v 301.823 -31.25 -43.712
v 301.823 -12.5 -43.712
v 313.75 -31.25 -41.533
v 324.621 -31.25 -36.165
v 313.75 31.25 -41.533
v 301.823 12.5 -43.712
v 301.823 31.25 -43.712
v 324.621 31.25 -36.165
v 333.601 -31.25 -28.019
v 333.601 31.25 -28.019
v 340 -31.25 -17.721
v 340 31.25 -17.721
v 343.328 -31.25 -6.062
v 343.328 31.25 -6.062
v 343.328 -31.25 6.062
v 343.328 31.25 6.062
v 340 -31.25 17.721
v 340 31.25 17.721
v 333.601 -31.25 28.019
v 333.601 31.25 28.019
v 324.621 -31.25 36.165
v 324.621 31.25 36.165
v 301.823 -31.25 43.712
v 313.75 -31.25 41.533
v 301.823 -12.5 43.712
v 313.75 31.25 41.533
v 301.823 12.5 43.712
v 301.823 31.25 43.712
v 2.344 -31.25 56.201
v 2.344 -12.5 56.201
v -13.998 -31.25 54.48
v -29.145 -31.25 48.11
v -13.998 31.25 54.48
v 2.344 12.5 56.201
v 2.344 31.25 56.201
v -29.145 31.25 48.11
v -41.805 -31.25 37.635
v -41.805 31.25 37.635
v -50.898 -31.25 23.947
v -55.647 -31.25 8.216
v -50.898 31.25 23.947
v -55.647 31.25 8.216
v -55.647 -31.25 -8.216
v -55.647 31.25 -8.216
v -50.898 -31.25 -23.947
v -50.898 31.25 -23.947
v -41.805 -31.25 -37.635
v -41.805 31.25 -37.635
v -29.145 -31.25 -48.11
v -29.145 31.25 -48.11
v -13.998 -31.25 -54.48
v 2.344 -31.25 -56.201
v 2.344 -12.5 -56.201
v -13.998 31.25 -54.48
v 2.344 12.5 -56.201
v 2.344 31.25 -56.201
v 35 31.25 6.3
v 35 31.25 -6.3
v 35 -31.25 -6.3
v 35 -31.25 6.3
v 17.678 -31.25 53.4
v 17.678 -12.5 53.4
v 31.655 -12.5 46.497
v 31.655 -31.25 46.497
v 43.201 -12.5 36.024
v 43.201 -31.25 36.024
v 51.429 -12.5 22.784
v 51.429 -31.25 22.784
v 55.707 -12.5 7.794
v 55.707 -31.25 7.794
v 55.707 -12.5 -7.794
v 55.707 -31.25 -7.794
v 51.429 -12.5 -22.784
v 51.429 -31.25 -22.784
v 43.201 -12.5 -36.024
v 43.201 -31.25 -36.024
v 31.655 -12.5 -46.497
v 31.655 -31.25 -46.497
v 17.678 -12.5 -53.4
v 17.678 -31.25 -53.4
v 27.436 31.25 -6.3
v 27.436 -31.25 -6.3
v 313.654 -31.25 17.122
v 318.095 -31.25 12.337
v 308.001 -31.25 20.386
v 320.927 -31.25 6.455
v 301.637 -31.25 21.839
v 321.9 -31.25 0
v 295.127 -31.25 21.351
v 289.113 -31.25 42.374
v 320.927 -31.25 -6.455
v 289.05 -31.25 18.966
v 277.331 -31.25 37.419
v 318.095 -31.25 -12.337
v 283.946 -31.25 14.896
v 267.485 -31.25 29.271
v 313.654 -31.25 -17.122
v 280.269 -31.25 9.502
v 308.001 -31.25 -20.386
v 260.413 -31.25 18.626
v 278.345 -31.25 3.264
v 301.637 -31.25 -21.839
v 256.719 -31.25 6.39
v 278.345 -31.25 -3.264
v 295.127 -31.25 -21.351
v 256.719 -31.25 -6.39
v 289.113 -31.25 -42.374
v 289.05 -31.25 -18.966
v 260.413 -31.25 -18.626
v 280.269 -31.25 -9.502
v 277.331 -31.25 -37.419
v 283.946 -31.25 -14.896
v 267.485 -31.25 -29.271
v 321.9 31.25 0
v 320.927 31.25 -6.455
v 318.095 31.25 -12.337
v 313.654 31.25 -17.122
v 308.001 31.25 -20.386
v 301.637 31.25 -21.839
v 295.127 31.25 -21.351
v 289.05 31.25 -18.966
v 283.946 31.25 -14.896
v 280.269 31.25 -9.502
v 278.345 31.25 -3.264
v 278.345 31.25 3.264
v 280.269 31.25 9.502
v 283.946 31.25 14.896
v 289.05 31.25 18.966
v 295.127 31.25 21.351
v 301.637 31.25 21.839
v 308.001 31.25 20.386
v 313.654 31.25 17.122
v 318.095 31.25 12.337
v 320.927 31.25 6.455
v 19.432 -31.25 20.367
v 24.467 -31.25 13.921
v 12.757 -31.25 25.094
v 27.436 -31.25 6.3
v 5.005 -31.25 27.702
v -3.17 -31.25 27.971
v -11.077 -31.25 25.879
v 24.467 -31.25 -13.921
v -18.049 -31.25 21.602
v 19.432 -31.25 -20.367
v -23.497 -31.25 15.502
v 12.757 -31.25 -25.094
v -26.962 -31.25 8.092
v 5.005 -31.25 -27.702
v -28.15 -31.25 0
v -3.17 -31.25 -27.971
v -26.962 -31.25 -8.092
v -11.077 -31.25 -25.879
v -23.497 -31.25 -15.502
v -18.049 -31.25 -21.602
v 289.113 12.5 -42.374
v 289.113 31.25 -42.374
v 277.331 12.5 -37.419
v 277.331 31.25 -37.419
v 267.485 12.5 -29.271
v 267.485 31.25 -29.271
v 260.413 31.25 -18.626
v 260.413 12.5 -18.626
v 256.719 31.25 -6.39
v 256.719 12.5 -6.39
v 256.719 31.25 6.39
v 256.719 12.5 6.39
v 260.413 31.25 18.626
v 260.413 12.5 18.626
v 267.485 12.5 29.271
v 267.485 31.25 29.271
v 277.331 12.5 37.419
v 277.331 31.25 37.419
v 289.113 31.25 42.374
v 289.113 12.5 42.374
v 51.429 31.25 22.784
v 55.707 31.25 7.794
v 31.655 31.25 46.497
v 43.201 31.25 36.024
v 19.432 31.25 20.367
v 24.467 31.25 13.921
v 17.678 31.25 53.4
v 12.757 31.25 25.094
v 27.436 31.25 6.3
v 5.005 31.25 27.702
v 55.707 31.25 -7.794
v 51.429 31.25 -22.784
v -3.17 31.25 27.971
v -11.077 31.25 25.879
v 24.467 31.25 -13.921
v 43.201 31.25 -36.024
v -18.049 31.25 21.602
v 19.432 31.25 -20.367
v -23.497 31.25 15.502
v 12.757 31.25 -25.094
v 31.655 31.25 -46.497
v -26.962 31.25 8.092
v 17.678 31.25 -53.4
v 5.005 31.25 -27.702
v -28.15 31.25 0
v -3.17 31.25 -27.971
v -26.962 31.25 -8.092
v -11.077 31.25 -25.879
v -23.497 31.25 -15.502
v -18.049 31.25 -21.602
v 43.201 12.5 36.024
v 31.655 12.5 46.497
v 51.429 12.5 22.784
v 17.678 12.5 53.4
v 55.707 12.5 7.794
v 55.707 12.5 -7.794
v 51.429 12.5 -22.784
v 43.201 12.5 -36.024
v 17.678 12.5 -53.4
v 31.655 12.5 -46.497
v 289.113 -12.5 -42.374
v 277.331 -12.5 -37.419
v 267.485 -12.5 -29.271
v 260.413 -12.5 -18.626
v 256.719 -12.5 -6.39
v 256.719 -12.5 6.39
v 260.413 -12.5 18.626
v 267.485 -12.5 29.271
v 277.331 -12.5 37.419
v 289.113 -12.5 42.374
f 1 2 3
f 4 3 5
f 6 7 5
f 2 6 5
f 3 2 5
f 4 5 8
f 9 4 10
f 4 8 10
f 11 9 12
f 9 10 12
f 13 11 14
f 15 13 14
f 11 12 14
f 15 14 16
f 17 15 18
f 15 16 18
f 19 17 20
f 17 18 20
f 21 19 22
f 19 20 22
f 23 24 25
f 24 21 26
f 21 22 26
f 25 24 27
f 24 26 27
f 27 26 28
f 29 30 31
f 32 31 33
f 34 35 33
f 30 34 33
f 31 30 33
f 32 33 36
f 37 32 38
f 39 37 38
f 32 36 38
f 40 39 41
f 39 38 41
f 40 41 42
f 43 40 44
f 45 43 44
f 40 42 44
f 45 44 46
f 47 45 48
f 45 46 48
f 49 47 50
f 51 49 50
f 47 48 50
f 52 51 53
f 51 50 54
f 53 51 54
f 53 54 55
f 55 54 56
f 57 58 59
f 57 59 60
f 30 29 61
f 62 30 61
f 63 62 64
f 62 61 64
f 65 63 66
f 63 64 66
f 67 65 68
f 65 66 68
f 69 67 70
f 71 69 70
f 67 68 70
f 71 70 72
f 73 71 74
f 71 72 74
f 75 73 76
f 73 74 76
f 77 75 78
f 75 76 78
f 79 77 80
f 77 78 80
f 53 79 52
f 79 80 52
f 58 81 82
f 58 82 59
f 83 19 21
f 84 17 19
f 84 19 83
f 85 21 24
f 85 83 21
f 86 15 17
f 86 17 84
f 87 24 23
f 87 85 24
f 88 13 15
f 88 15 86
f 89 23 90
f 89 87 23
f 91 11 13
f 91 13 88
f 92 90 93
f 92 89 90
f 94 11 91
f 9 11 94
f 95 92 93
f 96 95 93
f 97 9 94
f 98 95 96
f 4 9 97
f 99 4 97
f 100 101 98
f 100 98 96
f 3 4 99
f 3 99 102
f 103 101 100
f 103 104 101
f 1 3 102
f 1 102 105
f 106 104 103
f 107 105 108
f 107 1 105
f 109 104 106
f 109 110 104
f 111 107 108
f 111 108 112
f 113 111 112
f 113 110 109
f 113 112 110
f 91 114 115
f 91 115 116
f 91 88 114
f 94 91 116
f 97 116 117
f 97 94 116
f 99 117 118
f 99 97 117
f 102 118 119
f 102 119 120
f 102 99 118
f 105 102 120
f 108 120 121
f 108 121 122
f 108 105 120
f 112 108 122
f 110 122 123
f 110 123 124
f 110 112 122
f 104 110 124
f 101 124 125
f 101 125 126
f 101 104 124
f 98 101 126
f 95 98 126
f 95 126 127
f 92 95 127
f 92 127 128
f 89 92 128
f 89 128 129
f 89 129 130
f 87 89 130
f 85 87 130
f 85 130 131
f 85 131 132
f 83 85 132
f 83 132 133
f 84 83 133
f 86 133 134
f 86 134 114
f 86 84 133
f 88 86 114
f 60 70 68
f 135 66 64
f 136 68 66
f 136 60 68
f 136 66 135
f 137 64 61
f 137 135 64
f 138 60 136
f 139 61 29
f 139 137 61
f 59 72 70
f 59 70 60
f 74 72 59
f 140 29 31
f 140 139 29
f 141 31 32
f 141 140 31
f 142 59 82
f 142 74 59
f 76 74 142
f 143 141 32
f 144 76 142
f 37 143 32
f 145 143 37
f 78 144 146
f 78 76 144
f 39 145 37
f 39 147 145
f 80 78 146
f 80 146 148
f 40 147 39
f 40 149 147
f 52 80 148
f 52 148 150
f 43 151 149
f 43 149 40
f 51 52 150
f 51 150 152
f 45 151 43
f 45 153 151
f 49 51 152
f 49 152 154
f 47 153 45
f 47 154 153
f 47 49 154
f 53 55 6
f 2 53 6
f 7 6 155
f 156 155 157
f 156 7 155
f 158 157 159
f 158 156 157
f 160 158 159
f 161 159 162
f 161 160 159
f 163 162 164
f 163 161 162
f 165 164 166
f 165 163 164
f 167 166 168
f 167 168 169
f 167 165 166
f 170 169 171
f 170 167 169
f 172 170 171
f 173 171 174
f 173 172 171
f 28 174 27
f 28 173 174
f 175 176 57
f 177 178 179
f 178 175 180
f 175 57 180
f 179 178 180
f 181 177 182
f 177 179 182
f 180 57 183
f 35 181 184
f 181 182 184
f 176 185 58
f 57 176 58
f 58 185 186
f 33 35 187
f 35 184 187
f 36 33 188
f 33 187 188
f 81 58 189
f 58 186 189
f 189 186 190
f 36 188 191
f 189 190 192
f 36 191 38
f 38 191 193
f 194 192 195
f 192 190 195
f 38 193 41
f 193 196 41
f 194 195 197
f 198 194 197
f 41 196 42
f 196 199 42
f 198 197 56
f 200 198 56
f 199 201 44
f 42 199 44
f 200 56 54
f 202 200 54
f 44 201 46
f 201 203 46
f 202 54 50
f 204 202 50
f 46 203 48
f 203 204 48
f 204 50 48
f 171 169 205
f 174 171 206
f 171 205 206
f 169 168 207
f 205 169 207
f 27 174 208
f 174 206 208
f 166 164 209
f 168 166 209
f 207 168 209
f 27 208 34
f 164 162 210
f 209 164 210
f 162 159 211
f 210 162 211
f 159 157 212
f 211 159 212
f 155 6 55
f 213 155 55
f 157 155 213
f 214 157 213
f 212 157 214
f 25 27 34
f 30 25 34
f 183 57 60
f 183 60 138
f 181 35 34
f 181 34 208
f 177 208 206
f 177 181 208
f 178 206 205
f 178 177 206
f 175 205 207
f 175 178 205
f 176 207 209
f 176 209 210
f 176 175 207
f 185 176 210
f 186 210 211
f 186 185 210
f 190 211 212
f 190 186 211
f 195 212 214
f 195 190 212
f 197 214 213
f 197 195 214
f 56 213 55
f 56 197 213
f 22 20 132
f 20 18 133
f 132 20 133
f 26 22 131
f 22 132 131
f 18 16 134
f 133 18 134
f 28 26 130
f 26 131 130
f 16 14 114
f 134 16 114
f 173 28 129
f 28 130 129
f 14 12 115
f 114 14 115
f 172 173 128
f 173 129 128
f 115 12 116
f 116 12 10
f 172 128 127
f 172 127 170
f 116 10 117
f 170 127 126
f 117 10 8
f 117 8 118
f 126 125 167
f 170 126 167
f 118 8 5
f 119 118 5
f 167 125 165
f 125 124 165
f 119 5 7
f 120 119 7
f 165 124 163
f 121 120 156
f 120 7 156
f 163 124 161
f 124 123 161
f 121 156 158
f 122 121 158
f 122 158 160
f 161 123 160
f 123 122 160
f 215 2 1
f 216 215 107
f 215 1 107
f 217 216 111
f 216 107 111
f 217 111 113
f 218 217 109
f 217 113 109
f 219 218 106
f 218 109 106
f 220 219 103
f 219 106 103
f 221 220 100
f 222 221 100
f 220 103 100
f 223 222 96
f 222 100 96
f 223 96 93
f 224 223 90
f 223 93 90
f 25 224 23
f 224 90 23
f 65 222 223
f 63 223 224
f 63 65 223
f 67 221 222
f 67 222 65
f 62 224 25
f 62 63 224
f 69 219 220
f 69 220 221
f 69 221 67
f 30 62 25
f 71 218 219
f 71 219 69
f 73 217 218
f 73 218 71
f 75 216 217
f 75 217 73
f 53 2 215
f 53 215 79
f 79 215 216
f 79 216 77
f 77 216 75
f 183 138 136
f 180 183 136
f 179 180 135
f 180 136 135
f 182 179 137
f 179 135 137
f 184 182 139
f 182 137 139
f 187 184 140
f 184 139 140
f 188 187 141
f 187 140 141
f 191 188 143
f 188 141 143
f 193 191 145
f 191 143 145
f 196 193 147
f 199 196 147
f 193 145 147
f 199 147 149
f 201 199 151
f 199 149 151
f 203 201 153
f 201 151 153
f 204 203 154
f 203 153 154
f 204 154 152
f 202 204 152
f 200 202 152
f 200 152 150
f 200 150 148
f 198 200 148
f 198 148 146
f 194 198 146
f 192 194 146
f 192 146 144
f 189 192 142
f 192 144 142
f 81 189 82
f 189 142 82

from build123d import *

# Parameters (mm, degrees)
SKETCH1_R           = 21.9
BOSS_EXTRUDE1_DEPTH = 31.25
CUT_EXTRUDE1_DEPTH  = 18.75


with BuildPart() as part:
    # Sketch1 → Boss-Extrude1 (new body, symmetric)
    with BuildSketch(Plane(origin=(0, 0, 0), x_dir=(1, 0, 0), z_dir=(0, 1, 0))):
        with BuildLine():
            Line((2.34375, 56.201150664), (301.822916667, 43.712006072))
            ThreePointArc((301.822916667, 43.712006072), (343.75, 0), (301.822916667, -43.712006072))
            Line((301.822916667, -43.712006072), (2.34375, -56.201150664))
            ThreePointArc((2.34375, -56.201150664), (-56.25, 0), (2.34375, 56.201150664))
        make_face()
        with Locations((300, 0)):
            Circle(SKETCH1_R, mode=Mode.SUBTRACT)
        with BuildLine():
            Line((27.435970914, 6.3), (35, 6.3))
            Line((35, 6.3), (35, -6.3))
            Line((35, -6.3), (27.435970914, -6.3))
            ThreePointArc((27.435970914, -6.3), (-28.15, 0), (27.435970914, 6.3))
        make_face(mode=Mode.SUBTRACT)
    extrude(amount=BOSS_EXTRUDE1_DEPTH, both=True)

    # Sketch2 → Cut-Extrude1 (cut)
    with BuildSketch(Plane(origin=(0, 31.25, 0), x_dir=(1, 0, 0), z_dir=(0, 1, 0))):
        with BuildLine():
            Line((2.34375, 56.201150664), (301.822916667, 43.712006072))
            ThreePointArc((301.822916667, 43.712006072), (256.25, 0), (301.822916667, -43.712006072))
            Line((301.822916667, -43.712006072), (2.34375, -56.201150664))
            ThreePointArc((2.34375, -56.201150664), (56.25, 0), (2.34375, 56.201150664))
        make_face()
    cut_extrude1 = extrude(amount=-CUT_EXTRUDE1_DEPTH, mode=Mode.SUBTRACT)

    # Mirror1: Cut-Extrude1 across plane
    add(cut_extrude1.mirror(Plane.ZX), mode=Mode.SUBTRACT)


solid = part.part
